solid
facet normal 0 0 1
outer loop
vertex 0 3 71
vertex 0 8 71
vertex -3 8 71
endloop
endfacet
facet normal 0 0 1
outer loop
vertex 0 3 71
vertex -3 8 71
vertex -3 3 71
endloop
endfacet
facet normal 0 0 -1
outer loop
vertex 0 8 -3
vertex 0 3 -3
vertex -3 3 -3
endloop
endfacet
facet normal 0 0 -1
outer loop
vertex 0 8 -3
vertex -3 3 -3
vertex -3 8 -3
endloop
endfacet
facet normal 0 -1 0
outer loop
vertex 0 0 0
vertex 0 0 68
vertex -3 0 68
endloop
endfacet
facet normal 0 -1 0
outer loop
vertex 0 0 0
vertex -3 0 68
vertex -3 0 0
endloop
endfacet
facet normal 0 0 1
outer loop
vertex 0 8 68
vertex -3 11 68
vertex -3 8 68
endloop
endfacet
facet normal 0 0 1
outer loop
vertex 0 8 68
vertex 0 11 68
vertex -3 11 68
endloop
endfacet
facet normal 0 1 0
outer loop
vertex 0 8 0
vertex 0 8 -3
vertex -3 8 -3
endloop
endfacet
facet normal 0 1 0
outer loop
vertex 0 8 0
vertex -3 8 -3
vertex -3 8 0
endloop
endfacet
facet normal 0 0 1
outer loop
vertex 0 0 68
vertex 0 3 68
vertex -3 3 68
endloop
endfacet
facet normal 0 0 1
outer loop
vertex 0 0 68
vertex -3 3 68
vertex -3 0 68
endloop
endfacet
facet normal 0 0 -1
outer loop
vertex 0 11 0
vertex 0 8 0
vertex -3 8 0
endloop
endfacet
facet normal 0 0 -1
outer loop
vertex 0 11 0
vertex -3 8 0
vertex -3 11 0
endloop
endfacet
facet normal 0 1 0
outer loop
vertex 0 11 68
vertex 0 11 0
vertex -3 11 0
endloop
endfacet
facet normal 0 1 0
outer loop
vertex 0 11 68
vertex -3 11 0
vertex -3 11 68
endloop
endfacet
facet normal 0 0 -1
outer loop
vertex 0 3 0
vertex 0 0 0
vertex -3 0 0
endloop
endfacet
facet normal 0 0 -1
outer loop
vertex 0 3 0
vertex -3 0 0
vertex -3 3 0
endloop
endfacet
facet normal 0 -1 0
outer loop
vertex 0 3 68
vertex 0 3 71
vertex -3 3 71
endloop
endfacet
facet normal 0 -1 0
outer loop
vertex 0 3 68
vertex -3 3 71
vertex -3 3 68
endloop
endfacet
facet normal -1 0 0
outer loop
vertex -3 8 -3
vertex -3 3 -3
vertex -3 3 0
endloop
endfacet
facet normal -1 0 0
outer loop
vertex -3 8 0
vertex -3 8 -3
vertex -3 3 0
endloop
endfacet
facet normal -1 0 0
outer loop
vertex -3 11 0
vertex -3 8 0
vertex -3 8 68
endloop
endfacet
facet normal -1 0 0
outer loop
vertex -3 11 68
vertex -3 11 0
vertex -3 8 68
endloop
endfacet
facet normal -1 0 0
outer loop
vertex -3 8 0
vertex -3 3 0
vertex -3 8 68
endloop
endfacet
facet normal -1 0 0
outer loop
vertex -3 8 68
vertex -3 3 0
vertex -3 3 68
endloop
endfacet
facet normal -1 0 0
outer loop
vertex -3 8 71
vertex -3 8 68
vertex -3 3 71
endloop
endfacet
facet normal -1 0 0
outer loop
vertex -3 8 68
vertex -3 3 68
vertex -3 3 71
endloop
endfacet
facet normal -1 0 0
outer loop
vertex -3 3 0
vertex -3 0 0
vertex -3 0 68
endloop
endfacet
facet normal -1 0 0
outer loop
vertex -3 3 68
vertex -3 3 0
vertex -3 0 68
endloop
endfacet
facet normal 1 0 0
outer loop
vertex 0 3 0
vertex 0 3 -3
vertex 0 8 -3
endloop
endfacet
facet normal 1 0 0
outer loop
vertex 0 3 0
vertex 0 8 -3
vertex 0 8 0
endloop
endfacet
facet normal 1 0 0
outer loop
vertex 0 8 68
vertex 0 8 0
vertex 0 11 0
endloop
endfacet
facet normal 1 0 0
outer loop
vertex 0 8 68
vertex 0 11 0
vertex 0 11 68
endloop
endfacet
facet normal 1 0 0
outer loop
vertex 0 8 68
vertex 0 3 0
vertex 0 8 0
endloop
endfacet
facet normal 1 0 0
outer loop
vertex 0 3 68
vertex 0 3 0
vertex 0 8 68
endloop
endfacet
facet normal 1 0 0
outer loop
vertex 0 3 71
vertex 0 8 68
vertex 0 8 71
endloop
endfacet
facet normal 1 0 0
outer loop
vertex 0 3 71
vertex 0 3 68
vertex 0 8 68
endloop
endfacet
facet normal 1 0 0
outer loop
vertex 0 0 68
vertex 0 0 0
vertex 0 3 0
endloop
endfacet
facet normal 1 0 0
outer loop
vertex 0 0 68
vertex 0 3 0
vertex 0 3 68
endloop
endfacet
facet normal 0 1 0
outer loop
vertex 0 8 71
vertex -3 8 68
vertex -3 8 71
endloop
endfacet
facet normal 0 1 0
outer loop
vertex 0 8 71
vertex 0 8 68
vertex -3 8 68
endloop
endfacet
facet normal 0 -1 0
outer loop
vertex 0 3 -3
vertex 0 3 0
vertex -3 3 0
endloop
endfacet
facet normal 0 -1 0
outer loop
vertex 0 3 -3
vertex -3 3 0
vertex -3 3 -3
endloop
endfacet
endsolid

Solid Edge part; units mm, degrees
sketch "Sketch1" plane through (0, 0, 0) normal (1, 0, 0) x (0, 1, 0)
  line L0 (3, -3) -> (8, -3)
  line L1 (8, -3) -> (8, 0)
  line L2 (8, 0) -> (11, 0)
  line L3 (11, 0) -> (11, 68)
  line L4 (11, 68) -> (8, 68)
  line L5 (8, 68) -> (8, 71)
  line L6 (8, 71) -> (3, 71)
  line L7 (3, 71) -> (3, 68)
  line L8 (3, 68) -> (0, 68)
  line L9 (0, 68) -> (0, 0)
  line L10 (0, 0) -> (3, 0)
  line L11 (3, 0) -> (3, -3)
  dimension "D1" = 3
  dimension "D2" = 5
  dimension "D3" = 3
  dimension "D4" = 68
extrude "Protrusion1" add sketch "Sketch1" against normal blind 3
properties material "Acier"
